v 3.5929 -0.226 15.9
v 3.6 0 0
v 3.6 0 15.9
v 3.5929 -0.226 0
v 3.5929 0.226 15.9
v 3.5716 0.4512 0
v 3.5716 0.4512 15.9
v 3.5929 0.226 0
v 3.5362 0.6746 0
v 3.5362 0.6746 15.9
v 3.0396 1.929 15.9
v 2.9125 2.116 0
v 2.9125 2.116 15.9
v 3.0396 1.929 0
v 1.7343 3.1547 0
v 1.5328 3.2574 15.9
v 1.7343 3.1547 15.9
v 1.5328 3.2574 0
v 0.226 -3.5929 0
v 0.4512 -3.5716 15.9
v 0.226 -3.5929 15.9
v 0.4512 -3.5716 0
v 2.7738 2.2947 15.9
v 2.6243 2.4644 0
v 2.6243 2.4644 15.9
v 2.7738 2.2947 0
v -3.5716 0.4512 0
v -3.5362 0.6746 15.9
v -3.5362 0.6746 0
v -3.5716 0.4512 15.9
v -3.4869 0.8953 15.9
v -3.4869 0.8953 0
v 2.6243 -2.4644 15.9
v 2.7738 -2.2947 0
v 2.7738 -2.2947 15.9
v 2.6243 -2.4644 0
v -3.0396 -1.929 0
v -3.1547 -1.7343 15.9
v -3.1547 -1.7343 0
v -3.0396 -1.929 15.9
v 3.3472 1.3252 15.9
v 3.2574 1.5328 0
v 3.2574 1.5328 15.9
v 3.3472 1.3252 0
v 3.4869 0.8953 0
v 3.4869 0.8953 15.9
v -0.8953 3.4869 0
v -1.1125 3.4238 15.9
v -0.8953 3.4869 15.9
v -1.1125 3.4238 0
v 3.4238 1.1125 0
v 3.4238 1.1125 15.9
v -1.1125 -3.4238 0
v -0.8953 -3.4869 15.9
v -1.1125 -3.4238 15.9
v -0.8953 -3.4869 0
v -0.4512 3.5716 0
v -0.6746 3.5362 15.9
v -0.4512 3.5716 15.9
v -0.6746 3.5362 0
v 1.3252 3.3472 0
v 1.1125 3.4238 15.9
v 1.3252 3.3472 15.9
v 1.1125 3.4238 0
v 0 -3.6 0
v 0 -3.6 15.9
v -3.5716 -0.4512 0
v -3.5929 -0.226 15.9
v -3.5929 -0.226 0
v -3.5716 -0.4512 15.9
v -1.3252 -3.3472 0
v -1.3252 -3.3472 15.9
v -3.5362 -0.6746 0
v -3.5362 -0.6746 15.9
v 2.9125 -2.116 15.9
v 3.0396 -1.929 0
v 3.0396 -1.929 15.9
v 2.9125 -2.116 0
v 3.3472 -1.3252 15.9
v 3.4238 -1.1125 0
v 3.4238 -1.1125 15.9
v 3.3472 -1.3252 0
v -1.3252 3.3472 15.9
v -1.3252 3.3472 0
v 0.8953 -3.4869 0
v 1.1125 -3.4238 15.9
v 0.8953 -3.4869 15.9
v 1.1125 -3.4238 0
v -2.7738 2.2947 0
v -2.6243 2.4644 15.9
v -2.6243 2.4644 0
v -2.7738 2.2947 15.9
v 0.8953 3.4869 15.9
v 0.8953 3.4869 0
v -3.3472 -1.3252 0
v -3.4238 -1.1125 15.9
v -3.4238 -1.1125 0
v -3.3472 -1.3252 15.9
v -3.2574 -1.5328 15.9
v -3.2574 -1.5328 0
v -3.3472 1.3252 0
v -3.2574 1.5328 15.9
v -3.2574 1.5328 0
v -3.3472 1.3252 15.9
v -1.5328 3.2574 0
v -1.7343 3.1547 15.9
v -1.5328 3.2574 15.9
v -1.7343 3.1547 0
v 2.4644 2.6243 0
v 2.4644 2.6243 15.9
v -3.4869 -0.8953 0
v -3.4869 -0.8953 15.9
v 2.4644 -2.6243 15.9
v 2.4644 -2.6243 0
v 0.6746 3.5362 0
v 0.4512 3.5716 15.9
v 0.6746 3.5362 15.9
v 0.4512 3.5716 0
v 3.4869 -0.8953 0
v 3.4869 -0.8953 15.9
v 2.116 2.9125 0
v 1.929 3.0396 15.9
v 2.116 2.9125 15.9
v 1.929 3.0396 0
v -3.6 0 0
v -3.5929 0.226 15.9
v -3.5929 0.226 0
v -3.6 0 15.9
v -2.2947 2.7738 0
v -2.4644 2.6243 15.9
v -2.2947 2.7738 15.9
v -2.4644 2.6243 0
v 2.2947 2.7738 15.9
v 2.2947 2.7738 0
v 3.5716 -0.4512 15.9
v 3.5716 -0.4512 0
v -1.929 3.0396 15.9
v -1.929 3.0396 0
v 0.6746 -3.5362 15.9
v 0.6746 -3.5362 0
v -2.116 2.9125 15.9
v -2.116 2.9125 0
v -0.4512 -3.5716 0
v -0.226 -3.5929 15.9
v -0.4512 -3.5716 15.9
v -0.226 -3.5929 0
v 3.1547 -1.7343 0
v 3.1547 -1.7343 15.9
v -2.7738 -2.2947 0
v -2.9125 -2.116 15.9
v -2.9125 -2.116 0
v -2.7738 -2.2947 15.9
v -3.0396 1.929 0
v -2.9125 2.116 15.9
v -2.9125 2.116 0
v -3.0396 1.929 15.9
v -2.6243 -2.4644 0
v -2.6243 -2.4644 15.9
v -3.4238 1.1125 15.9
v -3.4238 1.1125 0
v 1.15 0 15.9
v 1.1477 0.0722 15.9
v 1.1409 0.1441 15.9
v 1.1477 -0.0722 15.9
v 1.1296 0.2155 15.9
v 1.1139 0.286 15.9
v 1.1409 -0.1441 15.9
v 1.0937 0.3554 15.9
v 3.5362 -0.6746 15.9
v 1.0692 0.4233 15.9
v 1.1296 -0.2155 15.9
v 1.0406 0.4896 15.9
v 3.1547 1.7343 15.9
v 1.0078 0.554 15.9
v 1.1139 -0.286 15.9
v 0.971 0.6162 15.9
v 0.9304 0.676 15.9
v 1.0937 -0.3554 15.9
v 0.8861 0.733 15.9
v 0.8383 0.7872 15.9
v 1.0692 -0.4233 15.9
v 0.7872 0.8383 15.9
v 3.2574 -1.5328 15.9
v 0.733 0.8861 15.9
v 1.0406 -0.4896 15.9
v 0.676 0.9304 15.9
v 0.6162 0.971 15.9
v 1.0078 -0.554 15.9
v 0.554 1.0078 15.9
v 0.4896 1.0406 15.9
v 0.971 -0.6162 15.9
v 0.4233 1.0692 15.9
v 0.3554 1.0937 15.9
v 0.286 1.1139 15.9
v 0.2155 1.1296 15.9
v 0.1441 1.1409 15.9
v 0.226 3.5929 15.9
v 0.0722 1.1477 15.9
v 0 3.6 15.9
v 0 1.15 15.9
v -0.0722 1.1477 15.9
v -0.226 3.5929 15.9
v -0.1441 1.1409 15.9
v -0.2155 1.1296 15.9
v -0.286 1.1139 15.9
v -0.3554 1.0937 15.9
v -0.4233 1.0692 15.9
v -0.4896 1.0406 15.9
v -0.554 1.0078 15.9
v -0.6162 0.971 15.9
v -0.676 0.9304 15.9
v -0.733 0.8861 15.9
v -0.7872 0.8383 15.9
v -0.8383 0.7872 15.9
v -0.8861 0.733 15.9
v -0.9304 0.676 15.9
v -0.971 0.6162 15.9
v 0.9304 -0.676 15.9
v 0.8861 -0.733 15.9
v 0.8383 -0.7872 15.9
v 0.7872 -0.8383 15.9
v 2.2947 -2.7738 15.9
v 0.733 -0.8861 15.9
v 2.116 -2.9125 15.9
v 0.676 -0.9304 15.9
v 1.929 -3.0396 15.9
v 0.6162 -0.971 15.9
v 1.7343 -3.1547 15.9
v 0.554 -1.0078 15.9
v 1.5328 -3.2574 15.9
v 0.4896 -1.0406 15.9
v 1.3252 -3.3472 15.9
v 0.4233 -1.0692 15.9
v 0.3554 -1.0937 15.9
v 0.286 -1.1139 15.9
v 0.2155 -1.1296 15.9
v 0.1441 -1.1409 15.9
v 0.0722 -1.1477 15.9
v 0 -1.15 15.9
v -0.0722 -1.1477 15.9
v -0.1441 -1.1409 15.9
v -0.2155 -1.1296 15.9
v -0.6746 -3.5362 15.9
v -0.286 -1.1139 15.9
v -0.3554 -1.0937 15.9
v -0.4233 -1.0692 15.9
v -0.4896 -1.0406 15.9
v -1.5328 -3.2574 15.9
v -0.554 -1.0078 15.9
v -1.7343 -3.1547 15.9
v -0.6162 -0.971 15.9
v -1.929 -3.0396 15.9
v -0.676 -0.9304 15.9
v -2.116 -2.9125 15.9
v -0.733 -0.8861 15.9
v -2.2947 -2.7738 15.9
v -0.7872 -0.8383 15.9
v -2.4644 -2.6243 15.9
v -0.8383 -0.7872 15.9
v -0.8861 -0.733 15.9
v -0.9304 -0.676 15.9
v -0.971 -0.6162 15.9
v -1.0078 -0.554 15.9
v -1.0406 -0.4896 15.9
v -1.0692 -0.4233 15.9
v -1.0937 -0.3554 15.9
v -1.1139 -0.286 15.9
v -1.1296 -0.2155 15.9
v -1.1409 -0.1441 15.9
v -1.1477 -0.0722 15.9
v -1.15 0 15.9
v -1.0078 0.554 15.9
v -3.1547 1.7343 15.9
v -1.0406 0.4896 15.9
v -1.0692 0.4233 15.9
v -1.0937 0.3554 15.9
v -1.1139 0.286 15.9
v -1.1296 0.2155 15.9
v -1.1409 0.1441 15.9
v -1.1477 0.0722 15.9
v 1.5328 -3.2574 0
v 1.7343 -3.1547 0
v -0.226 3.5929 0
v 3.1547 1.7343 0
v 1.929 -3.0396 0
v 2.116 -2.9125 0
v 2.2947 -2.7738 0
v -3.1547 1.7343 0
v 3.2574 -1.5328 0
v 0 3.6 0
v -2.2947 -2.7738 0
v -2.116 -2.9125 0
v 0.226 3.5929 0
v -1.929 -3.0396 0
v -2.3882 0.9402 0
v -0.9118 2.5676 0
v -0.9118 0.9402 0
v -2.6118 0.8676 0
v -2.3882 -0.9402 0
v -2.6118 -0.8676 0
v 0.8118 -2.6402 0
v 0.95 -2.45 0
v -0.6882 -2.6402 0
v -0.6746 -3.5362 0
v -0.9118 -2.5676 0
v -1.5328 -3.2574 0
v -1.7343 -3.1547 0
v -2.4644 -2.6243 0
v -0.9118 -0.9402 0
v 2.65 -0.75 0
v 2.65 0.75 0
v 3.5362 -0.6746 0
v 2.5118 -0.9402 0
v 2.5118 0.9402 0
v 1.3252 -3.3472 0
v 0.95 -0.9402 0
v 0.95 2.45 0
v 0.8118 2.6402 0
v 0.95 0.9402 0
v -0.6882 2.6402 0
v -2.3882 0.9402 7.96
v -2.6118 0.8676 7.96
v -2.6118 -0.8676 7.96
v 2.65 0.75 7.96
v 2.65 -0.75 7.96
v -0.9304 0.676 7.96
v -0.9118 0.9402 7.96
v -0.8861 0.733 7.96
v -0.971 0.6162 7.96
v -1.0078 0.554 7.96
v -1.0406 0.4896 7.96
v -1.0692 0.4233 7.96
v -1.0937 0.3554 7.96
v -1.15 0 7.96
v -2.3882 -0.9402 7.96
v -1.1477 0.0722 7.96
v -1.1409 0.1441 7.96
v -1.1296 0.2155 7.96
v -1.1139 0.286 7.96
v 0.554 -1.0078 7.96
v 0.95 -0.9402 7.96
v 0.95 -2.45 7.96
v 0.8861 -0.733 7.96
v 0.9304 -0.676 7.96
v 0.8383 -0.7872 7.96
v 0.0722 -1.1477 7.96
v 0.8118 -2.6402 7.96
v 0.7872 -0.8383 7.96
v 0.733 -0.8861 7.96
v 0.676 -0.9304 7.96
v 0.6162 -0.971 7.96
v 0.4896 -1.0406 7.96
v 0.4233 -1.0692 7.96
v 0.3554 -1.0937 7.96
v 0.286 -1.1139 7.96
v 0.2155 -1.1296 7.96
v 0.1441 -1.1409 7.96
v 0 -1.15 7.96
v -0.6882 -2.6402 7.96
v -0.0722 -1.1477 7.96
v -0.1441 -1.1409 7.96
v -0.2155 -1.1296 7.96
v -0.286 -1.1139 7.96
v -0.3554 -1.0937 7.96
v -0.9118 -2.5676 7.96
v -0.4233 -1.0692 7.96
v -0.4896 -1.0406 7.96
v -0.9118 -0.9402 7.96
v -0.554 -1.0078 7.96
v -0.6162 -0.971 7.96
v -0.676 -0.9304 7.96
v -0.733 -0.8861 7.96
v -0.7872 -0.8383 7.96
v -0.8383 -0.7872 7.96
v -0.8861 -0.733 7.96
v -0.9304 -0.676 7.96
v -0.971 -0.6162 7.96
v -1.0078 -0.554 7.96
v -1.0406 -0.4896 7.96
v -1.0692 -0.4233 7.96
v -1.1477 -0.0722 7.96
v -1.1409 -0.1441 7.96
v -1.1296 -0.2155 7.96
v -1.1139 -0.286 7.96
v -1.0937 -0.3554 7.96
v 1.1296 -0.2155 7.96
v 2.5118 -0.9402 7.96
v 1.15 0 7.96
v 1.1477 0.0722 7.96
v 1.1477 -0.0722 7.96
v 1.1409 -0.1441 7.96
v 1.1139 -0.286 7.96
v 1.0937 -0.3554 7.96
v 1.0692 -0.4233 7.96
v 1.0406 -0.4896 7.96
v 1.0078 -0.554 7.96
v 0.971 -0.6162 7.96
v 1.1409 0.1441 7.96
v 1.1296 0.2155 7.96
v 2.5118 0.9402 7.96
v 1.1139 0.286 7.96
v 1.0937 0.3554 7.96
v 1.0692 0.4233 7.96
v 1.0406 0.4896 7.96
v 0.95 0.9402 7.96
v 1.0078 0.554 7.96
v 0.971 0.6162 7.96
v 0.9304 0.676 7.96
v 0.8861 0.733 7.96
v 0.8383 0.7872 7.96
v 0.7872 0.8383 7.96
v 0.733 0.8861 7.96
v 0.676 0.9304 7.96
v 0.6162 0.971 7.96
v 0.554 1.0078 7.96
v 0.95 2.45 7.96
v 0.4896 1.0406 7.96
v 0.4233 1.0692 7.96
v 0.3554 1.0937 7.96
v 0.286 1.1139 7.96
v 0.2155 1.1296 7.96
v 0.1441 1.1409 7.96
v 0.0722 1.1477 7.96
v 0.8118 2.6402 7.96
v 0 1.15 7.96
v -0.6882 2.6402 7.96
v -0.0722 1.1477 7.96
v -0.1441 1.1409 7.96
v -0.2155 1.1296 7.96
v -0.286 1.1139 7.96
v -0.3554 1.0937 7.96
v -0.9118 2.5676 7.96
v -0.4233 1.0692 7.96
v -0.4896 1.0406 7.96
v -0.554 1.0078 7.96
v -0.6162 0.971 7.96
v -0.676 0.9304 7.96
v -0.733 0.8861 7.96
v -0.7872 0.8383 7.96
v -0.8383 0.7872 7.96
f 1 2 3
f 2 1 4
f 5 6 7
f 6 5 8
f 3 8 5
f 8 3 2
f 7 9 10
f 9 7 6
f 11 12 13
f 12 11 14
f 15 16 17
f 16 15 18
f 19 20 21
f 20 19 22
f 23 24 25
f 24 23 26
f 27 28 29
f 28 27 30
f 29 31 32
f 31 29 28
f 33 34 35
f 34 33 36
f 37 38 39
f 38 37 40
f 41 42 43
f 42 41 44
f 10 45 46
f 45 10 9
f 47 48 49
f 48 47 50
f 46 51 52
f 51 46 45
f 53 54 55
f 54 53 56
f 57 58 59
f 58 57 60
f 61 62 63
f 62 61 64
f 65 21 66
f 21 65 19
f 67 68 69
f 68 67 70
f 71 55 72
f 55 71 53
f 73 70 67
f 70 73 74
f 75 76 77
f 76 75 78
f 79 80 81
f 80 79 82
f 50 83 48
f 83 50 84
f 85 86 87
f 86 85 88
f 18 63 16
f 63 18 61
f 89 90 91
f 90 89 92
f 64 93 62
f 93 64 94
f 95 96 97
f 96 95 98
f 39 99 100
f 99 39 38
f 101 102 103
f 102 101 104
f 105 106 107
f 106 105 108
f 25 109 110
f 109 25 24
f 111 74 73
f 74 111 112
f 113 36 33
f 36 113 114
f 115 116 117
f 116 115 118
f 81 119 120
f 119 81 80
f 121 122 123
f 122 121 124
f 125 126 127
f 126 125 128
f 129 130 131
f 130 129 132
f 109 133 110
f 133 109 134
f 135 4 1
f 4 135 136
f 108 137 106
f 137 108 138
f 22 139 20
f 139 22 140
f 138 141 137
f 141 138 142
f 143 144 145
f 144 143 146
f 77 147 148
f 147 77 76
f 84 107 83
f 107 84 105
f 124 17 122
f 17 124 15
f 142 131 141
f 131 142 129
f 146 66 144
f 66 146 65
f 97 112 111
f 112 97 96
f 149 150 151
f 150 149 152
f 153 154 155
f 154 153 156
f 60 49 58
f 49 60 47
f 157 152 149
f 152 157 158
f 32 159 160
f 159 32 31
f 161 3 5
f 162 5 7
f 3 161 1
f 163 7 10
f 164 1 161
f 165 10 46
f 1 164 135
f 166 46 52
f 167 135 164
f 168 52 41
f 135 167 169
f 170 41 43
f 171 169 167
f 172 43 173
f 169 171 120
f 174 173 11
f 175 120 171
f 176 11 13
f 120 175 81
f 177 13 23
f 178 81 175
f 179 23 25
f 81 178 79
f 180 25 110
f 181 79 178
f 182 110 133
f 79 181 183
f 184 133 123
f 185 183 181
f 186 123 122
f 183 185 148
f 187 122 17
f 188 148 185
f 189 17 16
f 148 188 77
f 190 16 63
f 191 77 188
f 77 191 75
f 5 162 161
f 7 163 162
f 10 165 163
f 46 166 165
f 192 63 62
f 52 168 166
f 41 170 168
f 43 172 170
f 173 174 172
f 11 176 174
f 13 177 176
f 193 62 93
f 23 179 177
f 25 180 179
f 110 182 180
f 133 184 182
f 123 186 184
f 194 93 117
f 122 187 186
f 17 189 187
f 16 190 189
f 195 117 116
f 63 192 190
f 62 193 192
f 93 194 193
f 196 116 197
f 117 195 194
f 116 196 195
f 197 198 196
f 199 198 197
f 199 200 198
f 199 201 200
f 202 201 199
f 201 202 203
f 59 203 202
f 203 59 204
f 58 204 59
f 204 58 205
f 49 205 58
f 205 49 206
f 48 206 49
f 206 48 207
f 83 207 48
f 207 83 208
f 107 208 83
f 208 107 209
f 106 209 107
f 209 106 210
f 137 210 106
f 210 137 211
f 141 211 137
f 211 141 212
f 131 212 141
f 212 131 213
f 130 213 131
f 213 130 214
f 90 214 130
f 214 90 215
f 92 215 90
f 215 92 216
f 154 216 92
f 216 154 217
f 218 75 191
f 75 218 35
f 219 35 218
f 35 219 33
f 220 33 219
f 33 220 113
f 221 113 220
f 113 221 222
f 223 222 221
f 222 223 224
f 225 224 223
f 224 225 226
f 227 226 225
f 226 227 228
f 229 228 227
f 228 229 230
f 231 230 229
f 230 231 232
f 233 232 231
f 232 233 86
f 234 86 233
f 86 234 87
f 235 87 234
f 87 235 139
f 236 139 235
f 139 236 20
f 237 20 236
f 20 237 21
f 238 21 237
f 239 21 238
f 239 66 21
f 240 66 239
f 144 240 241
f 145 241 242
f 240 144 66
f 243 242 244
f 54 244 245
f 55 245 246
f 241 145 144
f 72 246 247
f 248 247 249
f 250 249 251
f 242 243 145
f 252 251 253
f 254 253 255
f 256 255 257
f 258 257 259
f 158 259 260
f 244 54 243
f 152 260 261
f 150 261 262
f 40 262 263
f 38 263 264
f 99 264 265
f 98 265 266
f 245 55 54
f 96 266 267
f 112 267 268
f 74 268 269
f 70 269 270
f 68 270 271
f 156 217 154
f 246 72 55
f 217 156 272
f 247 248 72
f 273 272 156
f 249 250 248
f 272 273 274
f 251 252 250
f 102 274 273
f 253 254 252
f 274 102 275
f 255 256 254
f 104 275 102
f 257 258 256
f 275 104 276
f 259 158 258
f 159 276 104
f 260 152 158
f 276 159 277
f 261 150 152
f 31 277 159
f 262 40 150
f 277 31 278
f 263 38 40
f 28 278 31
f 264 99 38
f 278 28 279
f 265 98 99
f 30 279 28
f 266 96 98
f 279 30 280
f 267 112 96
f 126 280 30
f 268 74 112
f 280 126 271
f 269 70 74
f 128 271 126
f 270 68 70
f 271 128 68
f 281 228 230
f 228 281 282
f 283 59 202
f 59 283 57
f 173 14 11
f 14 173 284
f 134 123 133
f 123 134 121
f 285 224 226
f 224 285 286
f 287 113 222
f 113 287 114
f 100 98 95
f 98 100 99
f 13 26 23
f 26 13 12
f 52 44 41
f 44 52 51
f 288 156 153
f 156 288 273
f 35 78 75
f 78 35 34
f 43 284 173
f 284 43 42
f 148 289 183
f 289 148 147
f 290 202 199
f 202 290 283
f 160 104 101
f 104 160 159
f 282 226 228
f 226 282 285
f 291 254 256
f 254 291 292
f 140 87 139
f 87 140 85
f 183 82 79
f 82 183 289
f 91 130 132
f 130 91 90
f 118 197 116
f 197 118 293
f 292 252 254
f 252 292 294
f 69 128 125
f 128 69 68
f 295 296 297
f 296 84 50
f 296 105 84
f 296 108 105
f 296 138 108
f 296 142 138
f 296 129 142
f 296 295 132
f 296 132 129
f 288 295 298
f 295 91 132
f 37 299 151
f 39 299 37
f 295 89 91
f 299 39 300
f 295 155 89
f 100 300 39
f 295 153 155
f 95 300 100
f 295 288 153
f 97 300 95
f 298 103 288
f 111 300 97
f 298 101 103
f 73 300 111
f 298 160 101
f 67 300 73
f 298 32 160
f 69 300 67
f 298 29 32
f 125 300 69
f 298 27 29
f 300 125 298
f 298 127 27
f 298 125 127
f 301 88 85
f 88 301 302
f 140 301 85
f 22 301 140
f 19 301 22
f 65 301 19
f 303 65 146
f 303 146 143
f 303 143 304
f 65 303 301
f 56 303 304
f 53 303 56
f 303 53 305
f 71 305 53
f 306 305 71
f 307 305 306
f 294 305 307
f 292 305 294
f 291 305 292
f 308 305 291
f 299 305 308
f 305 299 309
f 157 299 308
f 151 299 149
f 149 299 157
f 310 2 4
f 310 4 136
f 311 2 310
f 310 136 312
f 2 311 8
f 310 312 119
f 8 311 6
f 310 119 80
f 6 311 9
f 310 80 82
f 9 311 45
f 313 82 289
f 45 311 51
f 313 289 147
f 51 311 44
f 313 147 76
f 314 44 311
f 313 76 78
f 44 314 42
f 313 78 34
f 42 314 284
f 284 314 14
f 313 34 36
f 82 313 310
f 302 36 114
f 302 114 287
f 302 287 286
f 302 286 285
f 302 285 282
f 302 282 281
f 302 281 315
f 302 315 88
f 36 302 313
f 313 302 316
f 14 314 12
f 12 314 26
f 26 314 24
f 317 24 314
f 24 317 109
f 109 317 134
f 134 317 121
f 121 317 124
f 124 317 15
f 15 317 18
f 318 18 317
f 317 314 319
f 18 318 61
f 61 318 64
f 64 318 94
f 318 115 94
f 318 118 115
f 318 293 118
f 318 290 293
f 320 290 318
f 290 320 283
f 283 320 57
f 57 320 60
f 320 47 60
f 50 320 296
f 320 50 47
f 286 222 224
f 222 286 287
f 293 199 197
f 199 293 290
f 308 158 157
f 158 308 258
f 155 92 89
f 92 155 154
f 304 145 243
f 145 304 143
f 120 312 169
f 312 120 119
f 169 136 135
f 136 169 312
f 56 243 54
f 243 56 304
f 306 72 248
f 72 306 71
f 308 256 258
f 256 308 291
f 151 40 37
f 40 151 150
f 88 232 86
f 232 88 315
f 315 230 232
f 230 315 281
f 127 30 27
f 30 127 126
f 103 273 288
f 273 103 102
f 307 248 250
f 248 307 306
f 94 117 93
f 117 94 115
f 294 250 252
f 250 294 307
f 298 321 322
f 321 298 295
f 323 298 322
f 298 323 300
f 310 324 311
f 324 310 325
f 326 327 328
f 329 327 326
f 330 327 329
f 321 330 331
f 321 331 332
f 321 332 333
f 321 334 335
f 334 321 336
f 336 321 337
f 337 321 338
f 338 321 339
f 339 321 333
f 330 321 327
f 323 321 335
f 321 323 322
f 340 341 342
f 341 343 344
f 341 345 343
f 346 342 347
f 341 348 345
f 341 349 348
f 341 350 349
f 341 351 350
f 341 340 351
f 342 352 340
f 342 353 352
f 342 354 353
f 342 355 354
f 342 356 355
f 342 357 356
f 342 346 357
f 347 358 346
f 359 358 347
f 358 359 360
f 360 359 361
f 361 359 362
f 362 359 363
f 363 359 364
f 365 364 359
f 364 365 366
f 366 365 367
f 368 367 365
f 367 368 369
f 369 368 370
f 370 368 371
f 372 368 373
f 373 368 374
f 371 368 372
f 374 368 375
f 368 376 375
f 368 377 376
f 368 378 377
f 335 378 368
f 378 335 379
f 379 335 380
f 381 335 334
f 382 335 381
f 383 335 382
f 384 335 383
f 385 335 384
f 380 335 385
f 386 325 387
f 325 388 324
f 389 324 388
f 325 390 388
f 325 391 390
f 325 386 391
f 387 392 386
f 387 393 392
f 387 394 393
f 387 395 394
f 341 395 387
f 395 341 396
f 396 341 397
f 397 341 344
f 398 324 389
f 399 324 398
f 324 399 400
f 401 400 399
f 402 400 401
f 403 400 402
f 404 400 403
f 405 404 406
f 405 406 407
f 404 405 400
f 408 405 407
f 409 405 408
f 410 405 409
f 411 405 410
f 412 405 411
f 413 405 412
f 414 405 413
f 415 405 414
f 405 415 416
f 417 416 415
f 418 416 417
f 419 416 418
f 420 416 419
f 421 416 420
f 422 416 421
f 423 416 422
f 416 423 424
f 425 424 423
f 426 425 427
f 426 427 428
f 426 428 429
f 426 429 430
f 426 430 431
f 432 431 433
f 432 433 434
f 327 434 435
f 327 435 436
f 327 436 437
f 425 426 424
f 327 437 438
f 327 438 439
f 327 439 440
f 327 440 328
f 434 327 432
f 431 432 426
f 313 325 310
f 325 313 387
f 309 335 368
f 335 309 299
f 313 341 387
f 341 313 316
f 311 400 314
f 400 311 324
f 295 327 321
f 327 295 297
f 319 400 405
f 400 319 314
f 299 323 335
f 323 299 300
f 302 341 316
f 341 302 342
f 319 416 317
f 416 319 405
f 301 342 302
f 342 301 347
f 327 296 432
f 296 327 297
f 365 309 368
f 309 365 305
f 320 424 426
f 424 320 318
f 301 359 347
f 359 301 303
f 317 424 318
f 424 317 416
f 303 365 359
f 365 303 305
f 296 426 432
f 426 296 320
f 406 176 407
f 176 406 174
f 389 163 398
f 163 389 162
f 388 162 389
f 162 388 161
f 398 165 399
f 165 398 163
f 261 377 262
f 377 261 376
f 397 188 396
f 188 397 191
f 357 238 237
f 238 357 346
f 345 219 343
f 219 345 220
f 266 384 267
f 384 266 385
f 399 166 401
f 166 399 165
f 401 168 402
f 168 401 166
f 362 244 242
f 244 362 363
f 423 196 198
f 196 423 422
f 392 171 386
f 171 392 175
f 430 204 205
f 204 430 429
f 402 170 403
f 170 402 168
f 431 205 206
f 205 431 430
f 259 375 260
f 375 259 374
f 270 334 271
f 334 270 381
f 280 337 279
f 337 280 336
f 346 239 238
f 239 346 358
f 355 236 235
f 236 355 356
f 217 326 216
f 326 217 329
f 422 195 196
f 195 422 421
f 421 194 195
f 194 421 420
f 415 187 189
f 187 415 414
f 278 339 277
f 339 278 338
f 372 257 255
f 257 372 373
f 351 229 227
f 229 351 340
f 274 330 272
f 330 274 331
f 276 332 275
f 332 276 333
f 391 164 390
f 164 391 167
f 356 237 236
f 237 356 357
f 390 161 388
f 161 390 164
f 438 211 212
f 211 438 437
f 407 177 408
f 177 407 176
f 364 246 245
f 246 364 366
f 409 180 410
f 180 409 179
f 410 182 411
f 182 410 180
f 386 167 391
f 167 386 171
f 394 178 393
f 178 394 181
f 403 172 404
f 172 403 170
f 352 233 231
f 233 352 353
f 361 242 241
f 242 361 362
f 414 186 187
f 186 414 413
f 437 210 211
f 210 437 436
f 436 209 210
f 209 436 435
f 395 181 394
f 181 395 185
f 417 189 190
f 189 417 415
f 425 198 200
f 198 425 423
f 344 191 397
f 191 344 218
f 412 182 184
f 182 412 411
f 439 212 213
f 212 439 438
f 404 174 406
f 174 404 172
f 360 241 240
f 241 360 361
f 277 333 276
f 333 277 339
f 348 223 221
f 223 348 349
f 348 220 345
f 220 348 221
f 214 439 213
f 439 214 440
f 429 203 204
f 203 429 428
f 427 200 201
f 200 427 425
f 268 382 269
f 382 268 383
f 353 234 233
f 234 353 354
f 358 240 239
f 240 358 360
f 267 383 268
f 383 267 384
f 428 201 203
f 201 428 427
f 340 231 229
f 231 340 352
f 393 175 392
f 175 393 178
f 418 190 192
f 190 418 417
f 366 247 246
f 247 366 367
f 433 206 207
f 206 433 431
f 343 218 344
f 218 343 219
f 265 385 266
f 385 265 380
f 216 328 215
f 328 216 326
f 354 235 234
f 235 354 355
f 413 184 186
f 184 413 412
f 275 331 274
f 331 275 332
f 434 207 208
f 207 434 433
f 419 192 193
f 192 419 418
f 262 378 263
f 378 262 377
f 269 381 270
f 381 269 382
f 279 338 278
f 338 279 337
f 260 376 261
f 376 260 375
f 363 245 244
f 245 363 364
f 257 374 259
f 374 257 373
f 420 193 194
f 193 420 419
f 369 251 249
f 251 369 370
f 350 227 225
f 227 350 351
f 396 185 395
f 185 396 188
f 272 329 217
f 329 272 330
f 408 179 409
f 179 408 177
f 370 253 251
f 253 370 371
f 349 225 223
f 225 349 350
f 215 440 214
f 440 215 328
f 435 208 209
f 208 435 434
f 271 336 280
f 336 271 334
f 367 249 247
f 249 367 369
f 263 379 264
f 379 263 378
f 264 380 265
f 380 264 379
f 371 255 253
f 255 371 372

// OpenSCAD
// DC motor shaft to lego coupler
//
// Created by Moby Disk, 2015/02/08
// Thanks to mrob27 for thing 40410
//

// Diameters of various motor shafts:
// - Radio Shack 2730223: 2.0mm
// - Radio Shack 2730256: 2.3mm

// When 3D printing couplers, always try 0.1 - 0.3mm too big and test to see what actually fits

// Diameter of motor axle, in mm
motor_axle_diameter = 2.3;

// Do you want to try some different axle sizes to see what fits best?
try_bigger_sizes = "no"; // [yes,no]

// Length of the coupler, in mm
coupler_length = 15.9;

// Outside radius of the coupler, in mm
coupler_outside_diameter = 7.2;

coupler_round_to_lego_axle(motor_axle_diameter,0, coupler_length, coupler_outside_diameter);

spacing=coupler_outside_diameter*1.5;

if (try_bigger_sizes=="yes")
{
	for (bigger=[1:3])
	{
		translate([bigger*spacing,0,0])
		coupler_round_to_lego_axle(motor_axle_diameter,0.1*bigger, coupler_length, coupler_outside_diameter);
	}
}

// Coupler for round DC motor shafts
// 
// diameter: diameter of the motor's axle
// fudge: Additional radius for the axle hole
//        - For 3D printing, the hole for the motor shaft must be larger than the actual axle itself
//        - 0.2mm and 0.3mm seem to work, but this may vary based on the printer and material
// length: A lego coupler is typically 15.9mm
// outside: outside diameter, increase for more strength
//
module coupler_round_to_lego_axle(diameter, fudge=0.2, length=15.9, outside=7.2)
{
   // axle thickness is actually about 1.8 mm.  But for 3D printing, holes need to be bigger.
   axle_gap = 1.9;
   hole_radius = 2.65;

   motor_axle_diameter=diameter + fudge;
   difference()
   {
      // The coupler body
      translate([0,0,length/2])
      cylinder(r=outside/2,h=length,center=true,$fn=100);

      // The lego cross-axle hole
      translate([0 - hole_radius, 0 - axle_gap/2, -0.01])
      roundedRect([hole_radius * 2, axle_gap, length/2+0.02], .2);
      translate([0 - axle_gap/2, 0 - hole_radius, -0.01])
      roundedRect([axle_gap, hole_radius * 2, length/2+0.02], .2);

      // The hole for the motor shaft
      translate([0,0,length/2])
      cylinder(r=motor_axle_diameter/2,h=length+0.02,center=true,$fn=100);
   }
}

// ---------------------------------------------------------------------------------
//
// module for rounded rectangles by tlrobinson on Thingiverse in a 
// comment posted to http://www.thingiverse.com/thing:9347 on March
// 29, 2012, 3:57:46 AM EDT
//
module roundedRect(size, radius) {  
  x = size[0];  
  y = size[1];  
  z = size[2];  
 
  linear_extrude(height=z)  
  hull() {  
    translate([radius, radius, 0])  
      circle(r=radius);  
 
    translate([x - radius, radius, 0])  
      circle(r=radius);  
 
    translate([x - radius, y - radius, 0])  
      circle(r=radius);  
 
    translate([radius, y - radius, 0])  
      circle(r=radius);  
  }  
}
